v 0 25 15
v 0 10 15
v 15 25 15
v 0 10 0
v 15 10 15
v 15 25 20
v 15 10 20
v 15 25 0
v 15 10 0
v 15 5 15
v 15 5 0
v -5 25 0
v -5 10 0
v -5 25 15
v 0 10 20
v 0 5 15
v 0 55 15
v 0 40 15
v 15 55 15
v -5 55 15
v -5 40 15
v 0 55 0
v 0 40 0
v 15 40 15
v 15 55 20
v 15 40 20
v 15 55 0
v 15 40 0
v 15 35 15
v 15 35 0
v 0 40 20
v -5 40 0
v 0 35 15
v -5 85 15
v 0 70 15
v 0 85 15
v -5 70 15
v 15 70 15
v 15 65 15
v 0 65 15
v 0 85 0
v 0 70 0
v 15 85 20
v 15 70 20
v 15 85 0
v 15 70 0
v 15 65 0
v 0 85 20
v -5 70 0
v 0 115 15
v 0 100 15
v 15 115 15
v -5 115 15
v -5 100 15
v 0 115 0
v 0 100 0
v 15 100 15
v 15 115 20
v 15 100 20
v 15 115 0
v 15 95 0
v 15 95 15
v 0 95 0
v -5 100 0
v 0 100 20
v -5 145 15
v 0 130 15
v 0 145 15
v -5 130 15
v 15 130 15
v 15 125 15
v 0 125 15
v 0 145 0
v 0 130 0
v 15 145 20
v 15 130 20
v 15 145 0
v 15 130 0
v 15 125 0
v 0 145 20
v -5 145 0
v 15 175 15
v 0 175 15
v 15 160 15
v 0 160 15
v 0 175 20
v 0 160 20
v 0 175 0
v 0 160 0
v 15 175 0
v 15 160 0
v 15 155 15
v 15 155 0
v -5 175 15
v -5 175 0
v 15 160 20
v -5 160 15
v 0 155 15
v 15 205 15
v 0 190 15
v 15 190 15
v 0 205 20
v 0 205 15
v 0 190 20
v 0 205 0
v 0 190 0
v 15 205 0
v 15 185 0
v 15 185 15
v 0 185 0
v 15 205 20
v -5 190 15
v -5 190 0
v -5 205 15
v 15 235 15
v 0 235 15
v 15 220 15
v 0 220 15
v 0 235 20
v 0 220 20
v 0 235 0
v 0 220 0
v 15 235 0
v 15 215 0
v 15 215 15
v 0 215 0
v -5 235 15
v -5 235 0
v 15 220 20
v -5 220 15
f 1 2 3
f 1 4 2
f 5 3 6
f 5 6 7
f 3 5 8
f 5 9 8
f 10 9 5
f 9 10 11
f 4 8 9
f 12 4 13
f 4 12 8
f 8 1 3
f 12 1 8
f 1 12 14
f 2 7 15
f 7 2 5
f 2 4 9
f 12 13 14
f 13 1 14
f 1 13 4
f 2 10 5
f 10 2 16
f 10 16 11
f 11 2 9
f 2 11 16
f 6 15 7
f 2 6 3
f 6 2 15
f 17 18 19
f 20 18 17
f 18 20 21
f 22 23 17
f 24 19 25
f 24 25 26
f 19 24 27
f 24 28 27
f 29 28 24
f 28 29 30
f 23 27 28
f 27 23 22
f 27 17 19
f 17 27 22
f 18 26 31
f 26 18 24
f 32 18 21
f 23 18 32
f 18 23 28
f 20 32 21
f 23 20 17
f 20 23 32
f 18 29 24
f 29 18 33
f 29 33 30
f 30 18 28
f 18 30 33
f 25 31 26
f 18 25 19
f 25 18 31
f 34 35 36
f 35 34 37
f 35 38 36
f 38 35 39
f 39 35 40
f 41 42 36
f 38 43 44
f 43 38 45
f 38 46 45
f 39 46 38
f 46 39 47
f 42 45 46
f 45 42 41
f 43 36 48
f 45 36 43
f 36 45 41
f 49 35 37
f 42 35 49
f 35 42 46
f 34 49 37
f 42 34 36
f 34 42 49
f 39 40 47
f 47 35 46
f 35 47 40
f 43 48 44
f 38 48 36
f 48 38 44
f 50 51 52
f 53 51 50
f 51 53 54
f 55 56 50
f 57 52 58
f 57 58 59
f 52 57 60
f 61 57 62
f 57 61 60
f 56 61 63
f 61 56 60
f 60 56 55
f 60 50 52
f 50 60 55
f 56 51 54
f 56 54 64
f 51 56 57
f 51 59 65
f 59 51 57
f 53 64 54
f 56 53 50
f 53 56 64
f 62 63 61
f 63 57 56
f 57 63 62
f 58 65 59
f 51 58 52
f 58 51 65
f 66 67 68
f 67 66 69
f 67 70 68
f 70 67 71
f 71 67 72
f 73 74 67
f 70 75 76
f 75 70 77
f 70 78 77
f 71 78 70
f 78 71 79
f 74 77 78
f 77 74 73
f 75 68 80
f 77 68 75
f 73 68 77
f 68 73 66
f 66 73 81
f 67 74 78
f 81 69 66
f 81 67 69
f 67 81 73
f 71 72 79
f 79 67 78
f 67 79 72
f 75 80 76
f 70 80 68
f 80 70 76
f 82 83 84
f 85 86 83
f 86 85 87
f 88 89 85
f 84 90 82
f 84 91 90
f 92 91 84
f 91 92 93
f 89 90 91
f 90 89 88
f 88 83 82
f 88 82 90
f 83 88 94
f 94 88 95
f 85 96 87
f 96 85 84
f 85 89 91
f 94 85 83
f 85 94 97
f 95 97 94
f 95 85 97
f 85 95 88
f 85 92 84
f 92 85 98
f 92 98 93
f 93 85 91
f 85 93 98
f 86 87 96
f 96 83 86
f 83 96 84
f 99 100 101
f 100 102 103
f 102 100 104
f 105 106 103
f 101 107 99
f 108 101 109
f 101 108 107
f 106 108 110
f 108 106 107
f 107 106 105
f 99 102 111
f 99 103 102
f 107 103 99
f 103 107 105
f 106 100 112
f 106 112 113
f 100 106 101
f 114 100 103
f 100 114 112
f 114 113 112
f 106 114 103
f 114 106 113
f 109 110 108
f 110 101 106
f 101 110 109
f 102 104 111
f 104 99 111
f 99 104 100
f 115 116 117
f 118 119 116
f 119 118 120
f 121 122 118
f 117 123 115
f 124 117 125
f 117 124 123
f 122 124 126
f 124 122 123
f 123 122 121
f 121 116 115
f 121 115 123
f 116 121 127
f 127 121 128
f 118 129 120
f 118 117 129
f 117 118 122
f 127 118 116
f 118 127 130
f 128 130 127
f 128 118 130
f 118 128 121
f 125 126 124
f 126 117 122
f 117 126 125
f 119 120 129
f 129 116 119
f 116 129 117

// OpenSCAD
module default()
{
	cube([15, 15, 15],center=true);
}

module triangle()
{
translate ([-7.5,-7.5,0])
 polyhedron(
  points=[ [0,0,0], [15,0,0], [0,15,0], 
           [0,0,5],[15,0,5],[0,15,5]  ],
  faces=[ [0,1,2],[5,4,3], 
			 [3,1,0],[4,1,3],  [4,2,1],[5,2, 4], [2,5,0],[5,3,0] ]
 );

}



module wuerfel(a=[0,0,0]){
  union(){
    default();
    color([1,0,0])	rotate([0,0,0])	translate([0,0,7.5])	rotate([0,0,(a[0])*90])	triangle();
    color([0,1,0])	rotate([90,0,0])	translate([0,0,7.5])	rotate([0,0,(a[1])*90])	triangle();
    color([0,0,1])	rotate([0,90,0])	translate([0,0,7.5])	rotate([0,0,(a[2])*90])	triangle();
  }
}


for ( i = [0 : 3] )
{
 for ( j = [0 : 3] )
 {
  for ( k = [0 : 3] )
  {
//	translate([i*70,j*70,k*70]) wuerfel([i,j,k]);
  }
 }
}

b=0;
i=[
 [3, 1, 1], //
 [1, 1, 1], //
 [1, 1, 2], //
 [1, 4, 1], //
 [2, 1, 2], //
 [2, 1, 4], //
 [1, 4, 3], //
 [2, 4, 4]  //
 
 ];

translate ([7.5, 17.5, 7.5])
for(x=[0:len(i)-1])
{
 translate([0,x*30,0])  rotate([0,-90,0]) wuerfel(i[x]);	//rot, gruen, blau
}

//translate ([0, -5, 0]) cube([8*30-5,5,20]);
//translate ([0, 30, 0]) cube([8*30-5,5,20]);
//translate ([8*30-5, -5, 0]) cube([5,40,20]);


//wuerfel([3,1,1]);
